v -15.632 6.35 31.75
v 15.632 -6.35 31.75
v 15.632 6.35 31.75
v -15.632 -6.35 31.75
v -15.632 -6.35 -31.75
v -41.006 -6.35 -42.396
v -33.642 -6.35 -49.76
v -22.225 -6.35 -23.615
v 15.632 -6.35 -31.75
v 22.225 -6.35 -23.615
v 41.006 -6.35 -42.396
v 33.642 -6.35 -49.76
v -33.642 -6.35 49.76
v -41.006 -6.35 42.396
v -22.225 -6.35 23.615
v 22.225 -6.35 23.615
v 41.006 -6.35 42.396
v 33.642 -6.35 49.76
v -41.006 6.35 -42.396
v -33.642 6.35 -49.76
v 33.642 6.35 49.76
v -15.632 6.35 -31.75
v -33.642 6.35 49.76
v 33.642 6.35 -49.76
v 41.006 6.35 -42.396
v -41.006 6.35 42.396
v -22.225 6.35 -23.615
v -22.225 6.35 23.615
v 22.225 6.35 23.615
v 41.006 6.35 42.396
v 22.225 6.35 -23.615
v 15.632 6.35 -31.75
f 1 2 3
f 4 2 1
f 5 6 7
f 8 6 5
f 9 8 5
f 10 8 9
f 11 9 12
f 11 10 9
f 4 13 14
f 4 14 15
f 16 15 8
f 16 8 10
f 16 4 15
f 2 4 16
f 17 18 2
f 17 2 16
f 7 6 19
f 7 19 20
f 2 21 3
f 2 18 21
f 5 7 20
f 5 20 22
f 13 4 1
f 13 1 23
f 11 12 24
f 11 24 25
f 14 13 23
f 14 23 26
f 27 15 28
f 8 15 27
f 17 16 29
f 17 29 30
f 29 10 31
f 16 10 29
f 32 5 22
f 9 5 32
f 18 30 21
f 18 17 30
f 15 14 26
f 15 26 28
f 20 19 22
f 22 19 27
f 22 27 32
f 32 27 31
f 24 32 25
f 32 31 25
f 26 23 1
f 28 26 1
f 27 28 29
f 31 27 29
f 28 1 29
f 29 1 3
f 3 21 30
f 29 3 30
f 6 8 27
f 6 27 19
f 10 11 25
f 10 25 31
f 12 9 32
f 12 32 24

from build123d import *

# Parameters (mm, degrees)
F1_DEPTH = 6.35


with BuildPart() as f1:
    # F0 (on Front) → F1 (new body, symmetric)
    with BuildSketch(Plane.XZ):
        Polygon((12.08981, 28.207475), (15.632335, 31.75), (-15.632335, 31.75), (-12.08981, 28.207475), (-19.45362, 20.843665), (-22.225, 23.615045), (-22.225, -23.615045), (-19.45362, -20.843665), (-12.08981, -28.207475), (-15.632335, -31.75), (15.632335, -31.75), (12.08981, -28.207475), (19.45362, -20.843665), (22.225, -23.615045), (22.225, 23.615045), (19.45362, 20.843665), align=None)
        Polygon((-22.225, 31.75), (-15.632335, 31.75), (-33.642425, 49.76009), (-41.006235, 42.39628), (-22.225, 23.615045), align=None)
        Polygon((41.006235, -42.39628), (22.225, -23.615045), (22.225, -31.75), (15.632335, -31.75), (33.642425, -49.76009), align=None)
        Polygon((-22.225, -31.75), (-22.225, -23.615045), (-41.006235, -42.39628), (-33.642425, -49.76009), (-15.632335, -31.75), align=None)
        Polygon((15.632335, 31.75), (22.225, 31.75), (22.225, 23.615045), (41.006235, 42.39628), (33.642425, 49.76009), align=None)
        Polygon((22.225, -31.75), (22.225, -23.615045), (19.45362, -20.843665), (12.08981, -28.207475), (15.632335, -31.75), align=None)
        Polygon((-19.45362, -20.843665), (-22.225, -23.615045), (-22.225, -31.75), (-15.632335, -31.75), (-12.08981, -28.207475), align=None)
        Polygon((-12.08981, 28.207475), (-15.632335, 31.75), (-22.225, 31.75), (-22.225, 23.615045), (-19.45362, 20.843665), align=None)
        Polygon((22.225, 23.615045), (22.225, 31.75), (15.632335, 31.75), (12.08981, 28.207475), (19.45362, 20.843665), align=None)
    extrude(amount=F1_DEPTH, both=True)


solid = f1.part
